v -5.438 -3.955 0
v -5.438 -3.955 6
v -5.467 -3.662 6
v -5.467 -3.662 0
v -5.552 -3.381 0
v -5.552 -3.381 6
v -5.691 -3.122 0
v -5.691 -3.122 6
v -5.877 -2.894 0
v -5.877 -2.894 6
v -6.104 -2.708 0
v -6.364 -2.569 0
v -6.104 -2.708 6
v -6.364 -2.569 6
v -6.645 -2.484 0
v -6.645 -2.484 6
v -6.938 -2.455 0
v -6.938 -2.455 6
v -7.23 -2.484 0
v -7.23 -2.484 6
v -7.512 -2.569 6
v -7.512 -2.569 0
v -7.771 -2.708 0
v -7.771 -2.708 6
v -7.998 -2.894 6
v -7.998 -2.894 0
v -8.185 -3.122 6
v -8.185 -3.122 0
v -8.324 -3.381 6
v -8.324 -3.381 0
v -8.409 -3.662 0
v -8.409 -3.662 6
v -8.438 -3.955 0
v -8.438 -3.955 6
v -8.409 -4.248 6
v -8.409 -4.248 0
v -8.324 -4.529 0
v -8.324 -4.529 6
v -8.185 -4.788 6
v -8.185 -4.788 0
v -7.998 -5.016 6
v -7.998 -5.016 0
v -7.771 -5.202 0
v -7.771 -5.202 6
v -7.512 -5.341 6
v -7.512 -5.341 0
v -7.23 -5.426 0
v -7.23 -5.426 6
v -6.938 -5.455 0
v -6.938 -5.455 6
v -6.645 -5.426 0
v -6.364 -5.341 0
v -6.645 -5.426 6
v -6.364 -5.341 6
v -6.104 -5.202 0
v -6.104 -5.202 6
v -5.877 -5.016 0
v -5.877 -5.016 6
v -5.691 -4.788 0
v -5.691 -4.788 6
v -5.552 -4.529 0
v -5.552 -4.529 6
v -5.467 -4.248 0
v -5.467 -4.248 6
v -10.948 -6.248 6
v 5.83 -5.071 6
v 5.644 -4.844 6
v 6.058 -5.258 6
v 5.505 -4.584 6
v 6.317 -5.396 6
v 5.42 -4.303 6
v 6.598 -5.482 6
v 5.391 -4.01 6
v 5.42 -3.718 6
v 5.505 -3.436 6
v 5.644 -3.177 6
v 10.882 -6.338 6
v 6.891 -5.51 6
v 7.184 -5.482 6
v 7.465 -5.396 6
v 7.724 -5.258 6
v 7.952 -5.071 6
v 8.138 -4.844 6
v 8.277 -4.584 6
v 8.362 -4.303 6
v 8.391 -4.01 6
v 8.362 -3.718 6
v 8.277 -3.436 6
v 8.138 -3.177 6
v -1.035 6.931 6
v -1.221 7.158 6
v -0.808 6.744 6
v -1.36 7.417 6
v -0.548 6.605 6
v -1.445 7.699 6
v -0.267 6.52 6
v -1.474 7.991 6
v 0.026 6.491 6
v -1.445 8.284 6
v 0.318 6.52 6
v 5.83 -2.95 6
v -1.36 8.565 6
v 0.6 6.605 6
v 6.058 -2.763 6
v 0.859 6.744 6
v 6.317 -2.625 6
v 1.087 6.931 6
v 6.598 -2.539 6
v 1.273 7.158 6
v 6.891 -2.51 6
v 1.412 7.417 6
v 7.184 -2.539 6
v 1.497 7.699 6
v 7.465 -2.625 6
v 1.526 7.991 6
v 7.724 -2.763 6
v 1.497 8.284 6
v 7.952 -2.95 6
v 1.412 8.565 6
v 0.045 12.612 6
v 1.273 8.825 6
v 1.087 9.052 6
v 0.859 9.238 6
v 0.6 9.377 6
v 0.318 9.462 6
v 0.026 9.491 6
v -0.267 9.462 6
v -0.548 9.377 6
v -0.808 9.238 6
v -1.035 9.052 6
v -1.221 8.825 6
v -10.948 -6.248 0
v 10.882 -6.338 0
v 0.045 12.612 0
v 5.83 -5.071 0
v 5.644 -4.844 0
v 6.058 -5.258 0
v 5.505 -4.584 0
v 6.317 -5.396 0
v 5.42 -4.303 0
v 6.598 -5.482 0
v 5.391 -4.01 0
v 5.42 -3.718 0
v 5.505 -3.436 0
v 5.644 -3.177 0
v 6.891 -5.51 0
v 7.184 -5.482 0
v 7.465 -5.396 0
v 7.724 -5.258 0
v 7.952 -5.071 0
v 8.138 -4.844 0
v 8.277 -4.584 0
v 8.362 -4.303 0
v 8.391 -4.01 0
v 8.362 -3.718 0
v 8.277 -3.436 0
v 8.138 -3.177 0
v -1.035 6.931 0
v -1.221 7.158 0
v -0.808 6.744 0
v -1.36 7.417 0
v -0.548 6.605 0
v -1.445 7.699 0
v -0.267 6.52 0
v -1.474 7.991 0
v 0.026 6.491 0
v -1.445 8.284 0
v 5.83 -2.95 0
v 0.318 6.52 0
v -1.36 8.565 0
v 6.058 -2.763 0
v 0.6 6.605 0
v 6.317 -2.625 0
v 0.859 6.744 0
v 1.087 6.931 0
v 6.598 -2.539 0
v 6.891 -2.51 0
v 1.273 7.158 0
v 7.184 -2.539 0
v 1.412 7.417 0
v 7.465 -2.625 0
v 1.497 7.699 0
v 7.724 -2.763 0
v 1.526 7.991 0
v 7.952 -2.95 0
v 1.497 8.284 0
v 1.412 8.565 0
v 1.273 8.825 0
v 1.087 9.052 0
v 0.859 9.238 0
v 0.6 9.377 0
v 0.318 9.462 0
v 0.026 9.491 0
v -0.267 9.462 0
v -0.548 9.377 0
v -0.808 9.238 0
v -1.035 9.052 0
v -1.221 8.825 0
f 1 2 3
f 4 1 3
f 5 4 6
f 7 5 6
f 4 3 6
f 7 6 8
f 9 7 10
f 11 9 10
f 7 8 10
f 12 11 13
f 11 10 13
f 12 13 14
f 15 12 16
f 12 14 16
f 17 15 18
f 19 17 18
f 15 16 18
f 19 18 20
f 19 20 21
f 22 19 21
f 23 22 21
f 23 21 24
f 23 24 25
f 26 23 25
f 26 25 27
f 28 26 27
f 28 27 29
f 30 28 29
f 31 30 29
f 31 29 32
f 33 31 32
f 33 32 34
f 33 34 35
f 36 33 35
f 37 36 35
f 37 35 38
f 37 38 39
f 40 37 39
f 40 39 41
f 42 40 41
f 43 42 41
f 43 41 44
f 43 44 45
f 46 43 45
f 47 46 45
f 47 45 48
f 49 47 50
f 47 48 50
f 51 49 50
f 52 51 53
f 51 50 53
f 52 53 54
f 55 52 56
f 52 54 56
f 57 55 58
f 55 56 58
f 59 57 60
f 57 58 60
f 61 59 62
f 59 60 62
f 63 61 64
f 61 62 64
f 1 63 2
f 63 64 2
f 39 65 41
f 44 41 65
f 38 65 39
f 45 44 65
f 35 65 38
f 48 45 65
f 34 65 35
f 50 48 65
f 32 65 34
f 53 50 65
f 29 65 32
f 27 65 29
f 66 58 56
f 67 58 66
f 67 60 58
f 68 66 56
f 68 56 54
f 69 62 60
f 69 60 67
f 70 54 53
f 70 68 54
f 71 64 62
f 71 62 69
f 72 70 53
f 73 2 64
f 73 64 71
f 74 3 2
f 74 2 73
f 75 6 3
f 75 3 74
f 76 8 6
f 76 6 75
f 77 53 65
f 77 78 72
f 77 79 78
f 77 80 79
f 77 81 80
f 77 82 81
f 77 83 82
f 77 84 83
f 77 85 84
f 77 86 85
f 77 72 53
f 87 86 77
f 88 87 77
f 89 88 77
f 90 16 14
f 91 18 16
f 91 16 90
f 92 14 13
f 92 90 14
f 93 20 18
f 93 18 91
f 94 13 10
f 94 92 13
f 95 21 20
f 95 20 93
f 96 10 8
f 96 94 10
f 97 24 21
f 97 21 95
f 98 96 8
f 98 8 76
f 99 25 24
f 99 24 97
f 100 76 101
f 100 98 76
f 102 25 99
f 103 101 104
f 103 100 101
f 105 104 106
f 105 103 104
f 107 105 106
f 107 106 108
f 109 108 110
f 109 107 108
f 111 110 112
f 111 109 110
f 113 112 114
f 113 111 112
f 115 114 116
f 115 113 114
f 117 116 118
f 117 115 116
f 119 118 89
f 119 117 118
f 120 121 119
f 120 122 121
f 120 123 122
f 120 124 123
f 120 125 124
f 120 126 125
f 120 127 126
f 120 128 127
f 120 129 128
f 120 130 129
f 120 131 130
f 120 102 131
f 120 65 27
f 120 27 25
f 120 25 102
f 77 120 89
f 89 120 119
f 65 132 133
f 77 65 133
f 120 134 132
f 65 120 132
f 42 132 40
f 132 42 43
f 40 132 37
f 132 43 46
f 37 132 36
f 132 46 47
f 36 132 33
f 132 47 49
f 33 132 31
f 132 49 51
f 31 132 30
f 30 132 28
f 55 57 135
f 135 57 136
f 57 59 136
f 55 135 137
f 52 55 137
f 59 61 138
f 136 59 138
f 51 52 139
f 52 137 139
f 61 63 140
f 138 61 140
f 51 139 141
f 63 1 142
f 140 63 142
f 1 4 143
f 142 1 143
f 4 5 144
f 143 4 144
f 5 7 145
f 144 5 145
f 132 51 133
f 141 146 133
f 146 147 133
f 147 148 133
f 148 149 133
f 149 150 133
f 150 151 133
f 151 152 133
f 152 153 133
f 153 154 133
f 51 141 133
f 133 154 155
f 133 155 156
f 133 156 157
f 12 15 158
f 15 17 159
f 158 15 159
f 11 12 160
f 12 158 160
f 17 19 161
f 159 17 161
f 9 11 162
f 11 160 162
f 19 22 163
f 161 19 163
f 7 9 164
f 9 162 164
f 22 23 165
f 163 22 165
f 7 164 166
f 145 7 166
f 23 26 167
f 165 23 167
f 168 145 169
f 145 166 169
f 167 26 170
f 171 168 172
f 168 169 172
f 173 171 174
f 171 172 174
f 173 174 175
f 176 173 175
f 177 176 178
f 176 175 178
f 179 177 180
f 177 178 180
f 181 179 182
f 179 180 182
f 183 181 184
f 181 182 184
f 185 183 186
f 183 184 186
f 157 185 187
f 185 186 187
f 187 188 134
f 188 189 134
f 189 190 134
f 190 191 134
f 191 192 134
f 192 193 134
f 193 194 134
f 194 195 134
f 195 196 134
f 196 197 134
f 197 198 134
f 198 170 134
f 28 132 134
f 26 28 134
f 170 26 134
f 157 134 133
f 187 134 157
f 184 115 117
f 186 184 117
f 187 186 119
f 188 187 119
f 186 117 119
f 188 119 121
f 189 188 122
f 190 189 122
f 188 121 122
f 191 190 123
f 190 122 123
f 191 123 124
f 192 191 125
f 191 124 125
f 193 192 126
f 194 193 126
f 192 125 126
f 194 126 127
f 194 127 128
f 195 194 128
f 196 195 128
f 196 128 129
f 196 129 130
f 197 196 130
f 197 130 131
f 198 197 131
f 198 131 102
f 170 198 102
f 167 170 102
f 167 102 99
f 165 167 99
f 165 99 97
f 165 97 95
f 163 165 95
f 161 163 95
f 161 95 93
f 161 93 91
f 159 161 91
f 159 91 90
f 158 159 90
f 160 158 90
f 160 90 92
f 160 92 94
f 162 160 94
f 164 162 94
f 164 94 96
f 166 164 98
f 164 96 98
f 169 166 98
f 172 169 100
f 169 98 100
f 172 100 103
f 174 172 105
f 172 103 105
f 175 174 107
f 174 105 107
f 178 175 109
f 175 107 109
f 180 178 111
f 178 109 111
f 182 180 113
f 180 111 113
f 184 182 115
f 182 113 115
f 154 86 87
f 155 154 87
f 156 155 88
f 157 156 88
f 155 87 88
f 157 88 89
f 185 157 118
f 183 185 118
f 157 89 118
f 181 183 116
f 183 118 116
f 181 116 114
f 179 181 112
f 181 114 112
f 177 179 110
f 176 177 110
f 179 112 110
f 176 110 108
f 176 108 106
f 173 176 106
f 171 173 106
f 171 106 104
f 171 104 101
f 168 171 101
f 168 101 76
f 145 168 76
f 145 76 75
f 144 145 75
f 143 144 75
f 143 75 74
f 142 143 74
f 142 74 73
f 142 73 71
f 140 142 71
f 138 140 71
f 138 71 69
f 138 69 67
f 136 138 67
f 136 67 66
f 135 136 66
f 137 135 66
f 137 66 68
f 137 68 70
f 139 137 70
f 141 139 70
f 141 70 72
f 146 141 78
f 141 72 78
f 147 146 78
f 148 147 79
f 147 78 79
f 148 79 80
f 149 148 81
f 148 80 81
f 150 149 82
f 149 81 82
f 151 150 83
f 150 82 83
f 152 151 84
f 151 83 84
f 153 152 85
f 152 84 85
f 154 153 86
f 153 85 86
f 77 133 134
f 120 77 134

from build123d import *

# Parameters (mm, degrees)
BOSS_EXTRU_1_DEPTH      = 6
ESQUISSE14_R            = 1.5
ENL_V_MAT_EXTRU_1_DEPTH = 8


with BuildPart() as part:
    # Esquisse13 → Boss.-Extru.1 (new body)
    with BuildSketch(Plane.XY):
        Polygon((0.044605576, 12.611770032), (-10.948101074, -6.248487138), (10.881714082, -6.338321768), align=None)
    extrude(amount=BOSS_EXTRU_1_DEPTH)

    # Esquisse14 → Enlèv. mat.-Extru.1 (cut)
    with BuildSketch(Plane.XY.offset(6)):
        with Locations((0.025841827, 7.991160973)):
            Circle(ESQUISSE14_R)
        with Locations((6.891022326, -4.010372012)):
            Circle(ESQUISSE14_R)
        with Locations((-6.937774801, -3.955049343)):
            Circle(ESQUISSE14_R)
    extrude(amount=-ENL_V_MAT_EXTRU_1_DEPTH, mode=Mode.SUBTRACT)


solid = part.part
